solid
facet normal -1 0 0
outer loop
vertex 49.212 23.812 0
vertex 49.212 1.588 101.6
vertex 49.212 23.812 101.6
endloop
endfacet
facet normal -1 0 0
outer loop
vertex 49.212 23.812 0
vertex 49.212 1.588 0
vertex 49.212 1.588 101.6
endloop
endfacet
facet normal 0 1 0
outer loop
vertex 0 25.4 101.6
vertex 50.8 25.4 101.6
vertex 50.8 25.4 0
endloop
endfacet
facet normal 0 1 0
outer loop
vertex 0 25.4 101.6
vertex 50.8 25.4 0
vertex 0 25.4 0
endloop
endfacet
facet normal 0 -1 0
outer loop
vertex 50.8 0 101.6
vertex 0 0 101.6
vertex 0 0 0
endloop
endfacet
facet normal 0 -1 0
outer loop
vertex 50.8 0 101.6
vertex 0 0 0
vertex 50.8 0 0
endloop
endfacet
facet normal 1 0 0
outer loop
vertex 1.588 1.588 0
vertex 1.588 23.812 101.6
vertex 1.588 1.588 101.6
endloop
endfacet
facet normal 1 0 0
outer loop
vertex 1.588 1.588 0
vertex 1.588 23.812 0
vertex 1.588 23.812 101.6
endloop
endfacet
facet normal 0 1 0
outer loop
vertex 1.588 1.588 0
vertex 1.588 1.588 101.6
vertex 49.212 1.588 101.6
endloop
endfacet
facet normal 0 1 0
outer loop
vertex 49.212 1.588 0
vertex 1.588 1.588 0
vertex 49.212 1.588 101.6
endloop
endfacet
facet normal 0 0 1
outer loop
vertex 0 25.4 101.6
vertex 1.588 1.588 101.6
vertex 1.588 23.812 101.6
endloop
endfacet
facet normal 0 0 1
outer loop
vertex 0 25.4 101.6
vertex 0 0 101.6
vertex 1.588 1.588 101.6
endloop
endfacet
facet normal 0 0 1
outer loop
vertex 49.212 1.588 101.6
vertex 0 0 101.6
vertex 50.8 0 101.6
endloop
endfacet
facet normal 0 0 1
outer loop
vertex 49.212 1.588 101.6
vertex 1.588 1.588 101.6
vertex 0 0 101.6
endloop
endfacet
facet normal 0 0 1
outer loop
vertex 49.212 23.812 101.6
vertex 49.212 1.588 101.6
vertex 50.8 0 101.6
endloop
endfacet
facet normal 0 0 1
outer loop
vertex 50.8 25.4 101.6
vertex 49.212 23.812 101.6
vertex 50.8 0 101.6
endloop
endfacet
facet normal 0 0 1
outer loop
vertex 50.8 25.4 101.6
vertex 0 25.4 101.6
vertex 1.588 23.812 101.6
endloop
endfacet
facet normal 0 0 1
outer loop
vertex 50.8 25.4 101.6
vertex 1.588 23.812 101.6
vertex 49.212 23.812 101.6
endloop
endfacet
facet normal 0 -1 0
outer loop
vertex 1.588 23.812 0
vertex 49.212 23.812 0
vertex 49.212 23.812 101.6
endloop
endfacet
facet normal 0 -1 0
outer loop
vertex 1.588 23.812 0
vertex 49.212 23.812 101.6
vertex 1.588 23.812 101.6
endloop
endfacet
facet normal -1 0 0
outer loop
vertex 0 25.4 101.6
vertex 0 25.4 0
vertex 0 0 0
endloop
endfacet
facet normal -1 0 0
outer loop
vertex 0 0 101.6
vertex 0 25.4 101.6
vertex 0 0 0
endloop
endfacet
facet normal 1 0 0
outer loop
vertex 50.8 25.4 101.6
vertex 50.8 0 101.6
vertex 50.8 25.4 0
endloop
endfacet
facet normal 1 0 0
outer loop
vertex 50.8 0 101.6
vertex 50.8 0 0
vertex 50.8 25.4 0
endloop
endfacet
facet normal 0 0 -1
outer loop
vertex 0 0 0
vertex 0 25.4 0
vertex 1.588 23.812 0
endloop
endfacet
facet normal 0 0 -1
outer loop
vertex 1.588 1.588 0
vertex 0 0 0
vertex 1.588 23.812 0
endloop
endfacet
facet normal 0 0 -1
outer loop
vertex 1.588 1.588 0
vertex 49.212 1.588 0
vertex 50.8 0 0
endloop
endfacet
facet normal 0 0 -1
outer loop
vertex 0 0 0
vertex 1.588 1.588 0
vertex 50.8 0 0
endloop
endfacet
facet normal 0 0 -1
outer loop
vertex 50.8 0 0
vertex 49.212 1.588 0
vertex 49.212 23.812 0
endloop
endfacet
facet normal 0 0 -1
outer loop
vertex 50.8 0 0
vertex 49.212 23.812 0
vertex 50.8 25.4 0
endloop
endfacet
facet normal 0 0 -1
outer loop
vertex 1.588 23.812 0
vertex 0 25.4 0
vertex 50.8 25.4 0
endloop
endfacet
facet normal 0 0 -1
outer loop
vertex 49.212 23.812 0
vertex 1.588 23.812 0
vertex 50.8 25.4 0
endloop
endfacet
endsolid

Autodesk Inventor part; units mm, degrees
ref_plane "YZ Plane" through (0, 0, 0) normal (1, 0, 0) x (0, 1, 0)
ref_plane "XZ Plane" through (0, 0, 0) normal (0, 1, 0) x (-1, 0, 0)
ref_plane "XY Plane" through (0, 0, 0) normal (0, 0, 1) x (1, 0, 0)
sketch "Sketch1" plane through (0, 0, 0) normal (0, 0, 1) x (1, 0, 0)
  line L0 (0, 0) -> (50.8, 0)
  line L1 (50.8, 0) -> (50.8, 25.4)
  line L2 (50.8, 25.4) -> (0, 25.4)
  line L3 (0, 25.4) -> (0, 0)
  dimension "d0" = 50.8
  dimension "d1" = 25.4
extrude "Extrusion1" add sketch "Sketch1" along normal blind 101.6
shell "Shell1" thickness 1.5875 removed faces 2 at (16.9333, 8.4667, 0) at (16.9333, 8.4667, 101.6)
equation "\"d2\" = Length"
equation "\"Length\" = 101.6"
properties part number "standoff option1"
